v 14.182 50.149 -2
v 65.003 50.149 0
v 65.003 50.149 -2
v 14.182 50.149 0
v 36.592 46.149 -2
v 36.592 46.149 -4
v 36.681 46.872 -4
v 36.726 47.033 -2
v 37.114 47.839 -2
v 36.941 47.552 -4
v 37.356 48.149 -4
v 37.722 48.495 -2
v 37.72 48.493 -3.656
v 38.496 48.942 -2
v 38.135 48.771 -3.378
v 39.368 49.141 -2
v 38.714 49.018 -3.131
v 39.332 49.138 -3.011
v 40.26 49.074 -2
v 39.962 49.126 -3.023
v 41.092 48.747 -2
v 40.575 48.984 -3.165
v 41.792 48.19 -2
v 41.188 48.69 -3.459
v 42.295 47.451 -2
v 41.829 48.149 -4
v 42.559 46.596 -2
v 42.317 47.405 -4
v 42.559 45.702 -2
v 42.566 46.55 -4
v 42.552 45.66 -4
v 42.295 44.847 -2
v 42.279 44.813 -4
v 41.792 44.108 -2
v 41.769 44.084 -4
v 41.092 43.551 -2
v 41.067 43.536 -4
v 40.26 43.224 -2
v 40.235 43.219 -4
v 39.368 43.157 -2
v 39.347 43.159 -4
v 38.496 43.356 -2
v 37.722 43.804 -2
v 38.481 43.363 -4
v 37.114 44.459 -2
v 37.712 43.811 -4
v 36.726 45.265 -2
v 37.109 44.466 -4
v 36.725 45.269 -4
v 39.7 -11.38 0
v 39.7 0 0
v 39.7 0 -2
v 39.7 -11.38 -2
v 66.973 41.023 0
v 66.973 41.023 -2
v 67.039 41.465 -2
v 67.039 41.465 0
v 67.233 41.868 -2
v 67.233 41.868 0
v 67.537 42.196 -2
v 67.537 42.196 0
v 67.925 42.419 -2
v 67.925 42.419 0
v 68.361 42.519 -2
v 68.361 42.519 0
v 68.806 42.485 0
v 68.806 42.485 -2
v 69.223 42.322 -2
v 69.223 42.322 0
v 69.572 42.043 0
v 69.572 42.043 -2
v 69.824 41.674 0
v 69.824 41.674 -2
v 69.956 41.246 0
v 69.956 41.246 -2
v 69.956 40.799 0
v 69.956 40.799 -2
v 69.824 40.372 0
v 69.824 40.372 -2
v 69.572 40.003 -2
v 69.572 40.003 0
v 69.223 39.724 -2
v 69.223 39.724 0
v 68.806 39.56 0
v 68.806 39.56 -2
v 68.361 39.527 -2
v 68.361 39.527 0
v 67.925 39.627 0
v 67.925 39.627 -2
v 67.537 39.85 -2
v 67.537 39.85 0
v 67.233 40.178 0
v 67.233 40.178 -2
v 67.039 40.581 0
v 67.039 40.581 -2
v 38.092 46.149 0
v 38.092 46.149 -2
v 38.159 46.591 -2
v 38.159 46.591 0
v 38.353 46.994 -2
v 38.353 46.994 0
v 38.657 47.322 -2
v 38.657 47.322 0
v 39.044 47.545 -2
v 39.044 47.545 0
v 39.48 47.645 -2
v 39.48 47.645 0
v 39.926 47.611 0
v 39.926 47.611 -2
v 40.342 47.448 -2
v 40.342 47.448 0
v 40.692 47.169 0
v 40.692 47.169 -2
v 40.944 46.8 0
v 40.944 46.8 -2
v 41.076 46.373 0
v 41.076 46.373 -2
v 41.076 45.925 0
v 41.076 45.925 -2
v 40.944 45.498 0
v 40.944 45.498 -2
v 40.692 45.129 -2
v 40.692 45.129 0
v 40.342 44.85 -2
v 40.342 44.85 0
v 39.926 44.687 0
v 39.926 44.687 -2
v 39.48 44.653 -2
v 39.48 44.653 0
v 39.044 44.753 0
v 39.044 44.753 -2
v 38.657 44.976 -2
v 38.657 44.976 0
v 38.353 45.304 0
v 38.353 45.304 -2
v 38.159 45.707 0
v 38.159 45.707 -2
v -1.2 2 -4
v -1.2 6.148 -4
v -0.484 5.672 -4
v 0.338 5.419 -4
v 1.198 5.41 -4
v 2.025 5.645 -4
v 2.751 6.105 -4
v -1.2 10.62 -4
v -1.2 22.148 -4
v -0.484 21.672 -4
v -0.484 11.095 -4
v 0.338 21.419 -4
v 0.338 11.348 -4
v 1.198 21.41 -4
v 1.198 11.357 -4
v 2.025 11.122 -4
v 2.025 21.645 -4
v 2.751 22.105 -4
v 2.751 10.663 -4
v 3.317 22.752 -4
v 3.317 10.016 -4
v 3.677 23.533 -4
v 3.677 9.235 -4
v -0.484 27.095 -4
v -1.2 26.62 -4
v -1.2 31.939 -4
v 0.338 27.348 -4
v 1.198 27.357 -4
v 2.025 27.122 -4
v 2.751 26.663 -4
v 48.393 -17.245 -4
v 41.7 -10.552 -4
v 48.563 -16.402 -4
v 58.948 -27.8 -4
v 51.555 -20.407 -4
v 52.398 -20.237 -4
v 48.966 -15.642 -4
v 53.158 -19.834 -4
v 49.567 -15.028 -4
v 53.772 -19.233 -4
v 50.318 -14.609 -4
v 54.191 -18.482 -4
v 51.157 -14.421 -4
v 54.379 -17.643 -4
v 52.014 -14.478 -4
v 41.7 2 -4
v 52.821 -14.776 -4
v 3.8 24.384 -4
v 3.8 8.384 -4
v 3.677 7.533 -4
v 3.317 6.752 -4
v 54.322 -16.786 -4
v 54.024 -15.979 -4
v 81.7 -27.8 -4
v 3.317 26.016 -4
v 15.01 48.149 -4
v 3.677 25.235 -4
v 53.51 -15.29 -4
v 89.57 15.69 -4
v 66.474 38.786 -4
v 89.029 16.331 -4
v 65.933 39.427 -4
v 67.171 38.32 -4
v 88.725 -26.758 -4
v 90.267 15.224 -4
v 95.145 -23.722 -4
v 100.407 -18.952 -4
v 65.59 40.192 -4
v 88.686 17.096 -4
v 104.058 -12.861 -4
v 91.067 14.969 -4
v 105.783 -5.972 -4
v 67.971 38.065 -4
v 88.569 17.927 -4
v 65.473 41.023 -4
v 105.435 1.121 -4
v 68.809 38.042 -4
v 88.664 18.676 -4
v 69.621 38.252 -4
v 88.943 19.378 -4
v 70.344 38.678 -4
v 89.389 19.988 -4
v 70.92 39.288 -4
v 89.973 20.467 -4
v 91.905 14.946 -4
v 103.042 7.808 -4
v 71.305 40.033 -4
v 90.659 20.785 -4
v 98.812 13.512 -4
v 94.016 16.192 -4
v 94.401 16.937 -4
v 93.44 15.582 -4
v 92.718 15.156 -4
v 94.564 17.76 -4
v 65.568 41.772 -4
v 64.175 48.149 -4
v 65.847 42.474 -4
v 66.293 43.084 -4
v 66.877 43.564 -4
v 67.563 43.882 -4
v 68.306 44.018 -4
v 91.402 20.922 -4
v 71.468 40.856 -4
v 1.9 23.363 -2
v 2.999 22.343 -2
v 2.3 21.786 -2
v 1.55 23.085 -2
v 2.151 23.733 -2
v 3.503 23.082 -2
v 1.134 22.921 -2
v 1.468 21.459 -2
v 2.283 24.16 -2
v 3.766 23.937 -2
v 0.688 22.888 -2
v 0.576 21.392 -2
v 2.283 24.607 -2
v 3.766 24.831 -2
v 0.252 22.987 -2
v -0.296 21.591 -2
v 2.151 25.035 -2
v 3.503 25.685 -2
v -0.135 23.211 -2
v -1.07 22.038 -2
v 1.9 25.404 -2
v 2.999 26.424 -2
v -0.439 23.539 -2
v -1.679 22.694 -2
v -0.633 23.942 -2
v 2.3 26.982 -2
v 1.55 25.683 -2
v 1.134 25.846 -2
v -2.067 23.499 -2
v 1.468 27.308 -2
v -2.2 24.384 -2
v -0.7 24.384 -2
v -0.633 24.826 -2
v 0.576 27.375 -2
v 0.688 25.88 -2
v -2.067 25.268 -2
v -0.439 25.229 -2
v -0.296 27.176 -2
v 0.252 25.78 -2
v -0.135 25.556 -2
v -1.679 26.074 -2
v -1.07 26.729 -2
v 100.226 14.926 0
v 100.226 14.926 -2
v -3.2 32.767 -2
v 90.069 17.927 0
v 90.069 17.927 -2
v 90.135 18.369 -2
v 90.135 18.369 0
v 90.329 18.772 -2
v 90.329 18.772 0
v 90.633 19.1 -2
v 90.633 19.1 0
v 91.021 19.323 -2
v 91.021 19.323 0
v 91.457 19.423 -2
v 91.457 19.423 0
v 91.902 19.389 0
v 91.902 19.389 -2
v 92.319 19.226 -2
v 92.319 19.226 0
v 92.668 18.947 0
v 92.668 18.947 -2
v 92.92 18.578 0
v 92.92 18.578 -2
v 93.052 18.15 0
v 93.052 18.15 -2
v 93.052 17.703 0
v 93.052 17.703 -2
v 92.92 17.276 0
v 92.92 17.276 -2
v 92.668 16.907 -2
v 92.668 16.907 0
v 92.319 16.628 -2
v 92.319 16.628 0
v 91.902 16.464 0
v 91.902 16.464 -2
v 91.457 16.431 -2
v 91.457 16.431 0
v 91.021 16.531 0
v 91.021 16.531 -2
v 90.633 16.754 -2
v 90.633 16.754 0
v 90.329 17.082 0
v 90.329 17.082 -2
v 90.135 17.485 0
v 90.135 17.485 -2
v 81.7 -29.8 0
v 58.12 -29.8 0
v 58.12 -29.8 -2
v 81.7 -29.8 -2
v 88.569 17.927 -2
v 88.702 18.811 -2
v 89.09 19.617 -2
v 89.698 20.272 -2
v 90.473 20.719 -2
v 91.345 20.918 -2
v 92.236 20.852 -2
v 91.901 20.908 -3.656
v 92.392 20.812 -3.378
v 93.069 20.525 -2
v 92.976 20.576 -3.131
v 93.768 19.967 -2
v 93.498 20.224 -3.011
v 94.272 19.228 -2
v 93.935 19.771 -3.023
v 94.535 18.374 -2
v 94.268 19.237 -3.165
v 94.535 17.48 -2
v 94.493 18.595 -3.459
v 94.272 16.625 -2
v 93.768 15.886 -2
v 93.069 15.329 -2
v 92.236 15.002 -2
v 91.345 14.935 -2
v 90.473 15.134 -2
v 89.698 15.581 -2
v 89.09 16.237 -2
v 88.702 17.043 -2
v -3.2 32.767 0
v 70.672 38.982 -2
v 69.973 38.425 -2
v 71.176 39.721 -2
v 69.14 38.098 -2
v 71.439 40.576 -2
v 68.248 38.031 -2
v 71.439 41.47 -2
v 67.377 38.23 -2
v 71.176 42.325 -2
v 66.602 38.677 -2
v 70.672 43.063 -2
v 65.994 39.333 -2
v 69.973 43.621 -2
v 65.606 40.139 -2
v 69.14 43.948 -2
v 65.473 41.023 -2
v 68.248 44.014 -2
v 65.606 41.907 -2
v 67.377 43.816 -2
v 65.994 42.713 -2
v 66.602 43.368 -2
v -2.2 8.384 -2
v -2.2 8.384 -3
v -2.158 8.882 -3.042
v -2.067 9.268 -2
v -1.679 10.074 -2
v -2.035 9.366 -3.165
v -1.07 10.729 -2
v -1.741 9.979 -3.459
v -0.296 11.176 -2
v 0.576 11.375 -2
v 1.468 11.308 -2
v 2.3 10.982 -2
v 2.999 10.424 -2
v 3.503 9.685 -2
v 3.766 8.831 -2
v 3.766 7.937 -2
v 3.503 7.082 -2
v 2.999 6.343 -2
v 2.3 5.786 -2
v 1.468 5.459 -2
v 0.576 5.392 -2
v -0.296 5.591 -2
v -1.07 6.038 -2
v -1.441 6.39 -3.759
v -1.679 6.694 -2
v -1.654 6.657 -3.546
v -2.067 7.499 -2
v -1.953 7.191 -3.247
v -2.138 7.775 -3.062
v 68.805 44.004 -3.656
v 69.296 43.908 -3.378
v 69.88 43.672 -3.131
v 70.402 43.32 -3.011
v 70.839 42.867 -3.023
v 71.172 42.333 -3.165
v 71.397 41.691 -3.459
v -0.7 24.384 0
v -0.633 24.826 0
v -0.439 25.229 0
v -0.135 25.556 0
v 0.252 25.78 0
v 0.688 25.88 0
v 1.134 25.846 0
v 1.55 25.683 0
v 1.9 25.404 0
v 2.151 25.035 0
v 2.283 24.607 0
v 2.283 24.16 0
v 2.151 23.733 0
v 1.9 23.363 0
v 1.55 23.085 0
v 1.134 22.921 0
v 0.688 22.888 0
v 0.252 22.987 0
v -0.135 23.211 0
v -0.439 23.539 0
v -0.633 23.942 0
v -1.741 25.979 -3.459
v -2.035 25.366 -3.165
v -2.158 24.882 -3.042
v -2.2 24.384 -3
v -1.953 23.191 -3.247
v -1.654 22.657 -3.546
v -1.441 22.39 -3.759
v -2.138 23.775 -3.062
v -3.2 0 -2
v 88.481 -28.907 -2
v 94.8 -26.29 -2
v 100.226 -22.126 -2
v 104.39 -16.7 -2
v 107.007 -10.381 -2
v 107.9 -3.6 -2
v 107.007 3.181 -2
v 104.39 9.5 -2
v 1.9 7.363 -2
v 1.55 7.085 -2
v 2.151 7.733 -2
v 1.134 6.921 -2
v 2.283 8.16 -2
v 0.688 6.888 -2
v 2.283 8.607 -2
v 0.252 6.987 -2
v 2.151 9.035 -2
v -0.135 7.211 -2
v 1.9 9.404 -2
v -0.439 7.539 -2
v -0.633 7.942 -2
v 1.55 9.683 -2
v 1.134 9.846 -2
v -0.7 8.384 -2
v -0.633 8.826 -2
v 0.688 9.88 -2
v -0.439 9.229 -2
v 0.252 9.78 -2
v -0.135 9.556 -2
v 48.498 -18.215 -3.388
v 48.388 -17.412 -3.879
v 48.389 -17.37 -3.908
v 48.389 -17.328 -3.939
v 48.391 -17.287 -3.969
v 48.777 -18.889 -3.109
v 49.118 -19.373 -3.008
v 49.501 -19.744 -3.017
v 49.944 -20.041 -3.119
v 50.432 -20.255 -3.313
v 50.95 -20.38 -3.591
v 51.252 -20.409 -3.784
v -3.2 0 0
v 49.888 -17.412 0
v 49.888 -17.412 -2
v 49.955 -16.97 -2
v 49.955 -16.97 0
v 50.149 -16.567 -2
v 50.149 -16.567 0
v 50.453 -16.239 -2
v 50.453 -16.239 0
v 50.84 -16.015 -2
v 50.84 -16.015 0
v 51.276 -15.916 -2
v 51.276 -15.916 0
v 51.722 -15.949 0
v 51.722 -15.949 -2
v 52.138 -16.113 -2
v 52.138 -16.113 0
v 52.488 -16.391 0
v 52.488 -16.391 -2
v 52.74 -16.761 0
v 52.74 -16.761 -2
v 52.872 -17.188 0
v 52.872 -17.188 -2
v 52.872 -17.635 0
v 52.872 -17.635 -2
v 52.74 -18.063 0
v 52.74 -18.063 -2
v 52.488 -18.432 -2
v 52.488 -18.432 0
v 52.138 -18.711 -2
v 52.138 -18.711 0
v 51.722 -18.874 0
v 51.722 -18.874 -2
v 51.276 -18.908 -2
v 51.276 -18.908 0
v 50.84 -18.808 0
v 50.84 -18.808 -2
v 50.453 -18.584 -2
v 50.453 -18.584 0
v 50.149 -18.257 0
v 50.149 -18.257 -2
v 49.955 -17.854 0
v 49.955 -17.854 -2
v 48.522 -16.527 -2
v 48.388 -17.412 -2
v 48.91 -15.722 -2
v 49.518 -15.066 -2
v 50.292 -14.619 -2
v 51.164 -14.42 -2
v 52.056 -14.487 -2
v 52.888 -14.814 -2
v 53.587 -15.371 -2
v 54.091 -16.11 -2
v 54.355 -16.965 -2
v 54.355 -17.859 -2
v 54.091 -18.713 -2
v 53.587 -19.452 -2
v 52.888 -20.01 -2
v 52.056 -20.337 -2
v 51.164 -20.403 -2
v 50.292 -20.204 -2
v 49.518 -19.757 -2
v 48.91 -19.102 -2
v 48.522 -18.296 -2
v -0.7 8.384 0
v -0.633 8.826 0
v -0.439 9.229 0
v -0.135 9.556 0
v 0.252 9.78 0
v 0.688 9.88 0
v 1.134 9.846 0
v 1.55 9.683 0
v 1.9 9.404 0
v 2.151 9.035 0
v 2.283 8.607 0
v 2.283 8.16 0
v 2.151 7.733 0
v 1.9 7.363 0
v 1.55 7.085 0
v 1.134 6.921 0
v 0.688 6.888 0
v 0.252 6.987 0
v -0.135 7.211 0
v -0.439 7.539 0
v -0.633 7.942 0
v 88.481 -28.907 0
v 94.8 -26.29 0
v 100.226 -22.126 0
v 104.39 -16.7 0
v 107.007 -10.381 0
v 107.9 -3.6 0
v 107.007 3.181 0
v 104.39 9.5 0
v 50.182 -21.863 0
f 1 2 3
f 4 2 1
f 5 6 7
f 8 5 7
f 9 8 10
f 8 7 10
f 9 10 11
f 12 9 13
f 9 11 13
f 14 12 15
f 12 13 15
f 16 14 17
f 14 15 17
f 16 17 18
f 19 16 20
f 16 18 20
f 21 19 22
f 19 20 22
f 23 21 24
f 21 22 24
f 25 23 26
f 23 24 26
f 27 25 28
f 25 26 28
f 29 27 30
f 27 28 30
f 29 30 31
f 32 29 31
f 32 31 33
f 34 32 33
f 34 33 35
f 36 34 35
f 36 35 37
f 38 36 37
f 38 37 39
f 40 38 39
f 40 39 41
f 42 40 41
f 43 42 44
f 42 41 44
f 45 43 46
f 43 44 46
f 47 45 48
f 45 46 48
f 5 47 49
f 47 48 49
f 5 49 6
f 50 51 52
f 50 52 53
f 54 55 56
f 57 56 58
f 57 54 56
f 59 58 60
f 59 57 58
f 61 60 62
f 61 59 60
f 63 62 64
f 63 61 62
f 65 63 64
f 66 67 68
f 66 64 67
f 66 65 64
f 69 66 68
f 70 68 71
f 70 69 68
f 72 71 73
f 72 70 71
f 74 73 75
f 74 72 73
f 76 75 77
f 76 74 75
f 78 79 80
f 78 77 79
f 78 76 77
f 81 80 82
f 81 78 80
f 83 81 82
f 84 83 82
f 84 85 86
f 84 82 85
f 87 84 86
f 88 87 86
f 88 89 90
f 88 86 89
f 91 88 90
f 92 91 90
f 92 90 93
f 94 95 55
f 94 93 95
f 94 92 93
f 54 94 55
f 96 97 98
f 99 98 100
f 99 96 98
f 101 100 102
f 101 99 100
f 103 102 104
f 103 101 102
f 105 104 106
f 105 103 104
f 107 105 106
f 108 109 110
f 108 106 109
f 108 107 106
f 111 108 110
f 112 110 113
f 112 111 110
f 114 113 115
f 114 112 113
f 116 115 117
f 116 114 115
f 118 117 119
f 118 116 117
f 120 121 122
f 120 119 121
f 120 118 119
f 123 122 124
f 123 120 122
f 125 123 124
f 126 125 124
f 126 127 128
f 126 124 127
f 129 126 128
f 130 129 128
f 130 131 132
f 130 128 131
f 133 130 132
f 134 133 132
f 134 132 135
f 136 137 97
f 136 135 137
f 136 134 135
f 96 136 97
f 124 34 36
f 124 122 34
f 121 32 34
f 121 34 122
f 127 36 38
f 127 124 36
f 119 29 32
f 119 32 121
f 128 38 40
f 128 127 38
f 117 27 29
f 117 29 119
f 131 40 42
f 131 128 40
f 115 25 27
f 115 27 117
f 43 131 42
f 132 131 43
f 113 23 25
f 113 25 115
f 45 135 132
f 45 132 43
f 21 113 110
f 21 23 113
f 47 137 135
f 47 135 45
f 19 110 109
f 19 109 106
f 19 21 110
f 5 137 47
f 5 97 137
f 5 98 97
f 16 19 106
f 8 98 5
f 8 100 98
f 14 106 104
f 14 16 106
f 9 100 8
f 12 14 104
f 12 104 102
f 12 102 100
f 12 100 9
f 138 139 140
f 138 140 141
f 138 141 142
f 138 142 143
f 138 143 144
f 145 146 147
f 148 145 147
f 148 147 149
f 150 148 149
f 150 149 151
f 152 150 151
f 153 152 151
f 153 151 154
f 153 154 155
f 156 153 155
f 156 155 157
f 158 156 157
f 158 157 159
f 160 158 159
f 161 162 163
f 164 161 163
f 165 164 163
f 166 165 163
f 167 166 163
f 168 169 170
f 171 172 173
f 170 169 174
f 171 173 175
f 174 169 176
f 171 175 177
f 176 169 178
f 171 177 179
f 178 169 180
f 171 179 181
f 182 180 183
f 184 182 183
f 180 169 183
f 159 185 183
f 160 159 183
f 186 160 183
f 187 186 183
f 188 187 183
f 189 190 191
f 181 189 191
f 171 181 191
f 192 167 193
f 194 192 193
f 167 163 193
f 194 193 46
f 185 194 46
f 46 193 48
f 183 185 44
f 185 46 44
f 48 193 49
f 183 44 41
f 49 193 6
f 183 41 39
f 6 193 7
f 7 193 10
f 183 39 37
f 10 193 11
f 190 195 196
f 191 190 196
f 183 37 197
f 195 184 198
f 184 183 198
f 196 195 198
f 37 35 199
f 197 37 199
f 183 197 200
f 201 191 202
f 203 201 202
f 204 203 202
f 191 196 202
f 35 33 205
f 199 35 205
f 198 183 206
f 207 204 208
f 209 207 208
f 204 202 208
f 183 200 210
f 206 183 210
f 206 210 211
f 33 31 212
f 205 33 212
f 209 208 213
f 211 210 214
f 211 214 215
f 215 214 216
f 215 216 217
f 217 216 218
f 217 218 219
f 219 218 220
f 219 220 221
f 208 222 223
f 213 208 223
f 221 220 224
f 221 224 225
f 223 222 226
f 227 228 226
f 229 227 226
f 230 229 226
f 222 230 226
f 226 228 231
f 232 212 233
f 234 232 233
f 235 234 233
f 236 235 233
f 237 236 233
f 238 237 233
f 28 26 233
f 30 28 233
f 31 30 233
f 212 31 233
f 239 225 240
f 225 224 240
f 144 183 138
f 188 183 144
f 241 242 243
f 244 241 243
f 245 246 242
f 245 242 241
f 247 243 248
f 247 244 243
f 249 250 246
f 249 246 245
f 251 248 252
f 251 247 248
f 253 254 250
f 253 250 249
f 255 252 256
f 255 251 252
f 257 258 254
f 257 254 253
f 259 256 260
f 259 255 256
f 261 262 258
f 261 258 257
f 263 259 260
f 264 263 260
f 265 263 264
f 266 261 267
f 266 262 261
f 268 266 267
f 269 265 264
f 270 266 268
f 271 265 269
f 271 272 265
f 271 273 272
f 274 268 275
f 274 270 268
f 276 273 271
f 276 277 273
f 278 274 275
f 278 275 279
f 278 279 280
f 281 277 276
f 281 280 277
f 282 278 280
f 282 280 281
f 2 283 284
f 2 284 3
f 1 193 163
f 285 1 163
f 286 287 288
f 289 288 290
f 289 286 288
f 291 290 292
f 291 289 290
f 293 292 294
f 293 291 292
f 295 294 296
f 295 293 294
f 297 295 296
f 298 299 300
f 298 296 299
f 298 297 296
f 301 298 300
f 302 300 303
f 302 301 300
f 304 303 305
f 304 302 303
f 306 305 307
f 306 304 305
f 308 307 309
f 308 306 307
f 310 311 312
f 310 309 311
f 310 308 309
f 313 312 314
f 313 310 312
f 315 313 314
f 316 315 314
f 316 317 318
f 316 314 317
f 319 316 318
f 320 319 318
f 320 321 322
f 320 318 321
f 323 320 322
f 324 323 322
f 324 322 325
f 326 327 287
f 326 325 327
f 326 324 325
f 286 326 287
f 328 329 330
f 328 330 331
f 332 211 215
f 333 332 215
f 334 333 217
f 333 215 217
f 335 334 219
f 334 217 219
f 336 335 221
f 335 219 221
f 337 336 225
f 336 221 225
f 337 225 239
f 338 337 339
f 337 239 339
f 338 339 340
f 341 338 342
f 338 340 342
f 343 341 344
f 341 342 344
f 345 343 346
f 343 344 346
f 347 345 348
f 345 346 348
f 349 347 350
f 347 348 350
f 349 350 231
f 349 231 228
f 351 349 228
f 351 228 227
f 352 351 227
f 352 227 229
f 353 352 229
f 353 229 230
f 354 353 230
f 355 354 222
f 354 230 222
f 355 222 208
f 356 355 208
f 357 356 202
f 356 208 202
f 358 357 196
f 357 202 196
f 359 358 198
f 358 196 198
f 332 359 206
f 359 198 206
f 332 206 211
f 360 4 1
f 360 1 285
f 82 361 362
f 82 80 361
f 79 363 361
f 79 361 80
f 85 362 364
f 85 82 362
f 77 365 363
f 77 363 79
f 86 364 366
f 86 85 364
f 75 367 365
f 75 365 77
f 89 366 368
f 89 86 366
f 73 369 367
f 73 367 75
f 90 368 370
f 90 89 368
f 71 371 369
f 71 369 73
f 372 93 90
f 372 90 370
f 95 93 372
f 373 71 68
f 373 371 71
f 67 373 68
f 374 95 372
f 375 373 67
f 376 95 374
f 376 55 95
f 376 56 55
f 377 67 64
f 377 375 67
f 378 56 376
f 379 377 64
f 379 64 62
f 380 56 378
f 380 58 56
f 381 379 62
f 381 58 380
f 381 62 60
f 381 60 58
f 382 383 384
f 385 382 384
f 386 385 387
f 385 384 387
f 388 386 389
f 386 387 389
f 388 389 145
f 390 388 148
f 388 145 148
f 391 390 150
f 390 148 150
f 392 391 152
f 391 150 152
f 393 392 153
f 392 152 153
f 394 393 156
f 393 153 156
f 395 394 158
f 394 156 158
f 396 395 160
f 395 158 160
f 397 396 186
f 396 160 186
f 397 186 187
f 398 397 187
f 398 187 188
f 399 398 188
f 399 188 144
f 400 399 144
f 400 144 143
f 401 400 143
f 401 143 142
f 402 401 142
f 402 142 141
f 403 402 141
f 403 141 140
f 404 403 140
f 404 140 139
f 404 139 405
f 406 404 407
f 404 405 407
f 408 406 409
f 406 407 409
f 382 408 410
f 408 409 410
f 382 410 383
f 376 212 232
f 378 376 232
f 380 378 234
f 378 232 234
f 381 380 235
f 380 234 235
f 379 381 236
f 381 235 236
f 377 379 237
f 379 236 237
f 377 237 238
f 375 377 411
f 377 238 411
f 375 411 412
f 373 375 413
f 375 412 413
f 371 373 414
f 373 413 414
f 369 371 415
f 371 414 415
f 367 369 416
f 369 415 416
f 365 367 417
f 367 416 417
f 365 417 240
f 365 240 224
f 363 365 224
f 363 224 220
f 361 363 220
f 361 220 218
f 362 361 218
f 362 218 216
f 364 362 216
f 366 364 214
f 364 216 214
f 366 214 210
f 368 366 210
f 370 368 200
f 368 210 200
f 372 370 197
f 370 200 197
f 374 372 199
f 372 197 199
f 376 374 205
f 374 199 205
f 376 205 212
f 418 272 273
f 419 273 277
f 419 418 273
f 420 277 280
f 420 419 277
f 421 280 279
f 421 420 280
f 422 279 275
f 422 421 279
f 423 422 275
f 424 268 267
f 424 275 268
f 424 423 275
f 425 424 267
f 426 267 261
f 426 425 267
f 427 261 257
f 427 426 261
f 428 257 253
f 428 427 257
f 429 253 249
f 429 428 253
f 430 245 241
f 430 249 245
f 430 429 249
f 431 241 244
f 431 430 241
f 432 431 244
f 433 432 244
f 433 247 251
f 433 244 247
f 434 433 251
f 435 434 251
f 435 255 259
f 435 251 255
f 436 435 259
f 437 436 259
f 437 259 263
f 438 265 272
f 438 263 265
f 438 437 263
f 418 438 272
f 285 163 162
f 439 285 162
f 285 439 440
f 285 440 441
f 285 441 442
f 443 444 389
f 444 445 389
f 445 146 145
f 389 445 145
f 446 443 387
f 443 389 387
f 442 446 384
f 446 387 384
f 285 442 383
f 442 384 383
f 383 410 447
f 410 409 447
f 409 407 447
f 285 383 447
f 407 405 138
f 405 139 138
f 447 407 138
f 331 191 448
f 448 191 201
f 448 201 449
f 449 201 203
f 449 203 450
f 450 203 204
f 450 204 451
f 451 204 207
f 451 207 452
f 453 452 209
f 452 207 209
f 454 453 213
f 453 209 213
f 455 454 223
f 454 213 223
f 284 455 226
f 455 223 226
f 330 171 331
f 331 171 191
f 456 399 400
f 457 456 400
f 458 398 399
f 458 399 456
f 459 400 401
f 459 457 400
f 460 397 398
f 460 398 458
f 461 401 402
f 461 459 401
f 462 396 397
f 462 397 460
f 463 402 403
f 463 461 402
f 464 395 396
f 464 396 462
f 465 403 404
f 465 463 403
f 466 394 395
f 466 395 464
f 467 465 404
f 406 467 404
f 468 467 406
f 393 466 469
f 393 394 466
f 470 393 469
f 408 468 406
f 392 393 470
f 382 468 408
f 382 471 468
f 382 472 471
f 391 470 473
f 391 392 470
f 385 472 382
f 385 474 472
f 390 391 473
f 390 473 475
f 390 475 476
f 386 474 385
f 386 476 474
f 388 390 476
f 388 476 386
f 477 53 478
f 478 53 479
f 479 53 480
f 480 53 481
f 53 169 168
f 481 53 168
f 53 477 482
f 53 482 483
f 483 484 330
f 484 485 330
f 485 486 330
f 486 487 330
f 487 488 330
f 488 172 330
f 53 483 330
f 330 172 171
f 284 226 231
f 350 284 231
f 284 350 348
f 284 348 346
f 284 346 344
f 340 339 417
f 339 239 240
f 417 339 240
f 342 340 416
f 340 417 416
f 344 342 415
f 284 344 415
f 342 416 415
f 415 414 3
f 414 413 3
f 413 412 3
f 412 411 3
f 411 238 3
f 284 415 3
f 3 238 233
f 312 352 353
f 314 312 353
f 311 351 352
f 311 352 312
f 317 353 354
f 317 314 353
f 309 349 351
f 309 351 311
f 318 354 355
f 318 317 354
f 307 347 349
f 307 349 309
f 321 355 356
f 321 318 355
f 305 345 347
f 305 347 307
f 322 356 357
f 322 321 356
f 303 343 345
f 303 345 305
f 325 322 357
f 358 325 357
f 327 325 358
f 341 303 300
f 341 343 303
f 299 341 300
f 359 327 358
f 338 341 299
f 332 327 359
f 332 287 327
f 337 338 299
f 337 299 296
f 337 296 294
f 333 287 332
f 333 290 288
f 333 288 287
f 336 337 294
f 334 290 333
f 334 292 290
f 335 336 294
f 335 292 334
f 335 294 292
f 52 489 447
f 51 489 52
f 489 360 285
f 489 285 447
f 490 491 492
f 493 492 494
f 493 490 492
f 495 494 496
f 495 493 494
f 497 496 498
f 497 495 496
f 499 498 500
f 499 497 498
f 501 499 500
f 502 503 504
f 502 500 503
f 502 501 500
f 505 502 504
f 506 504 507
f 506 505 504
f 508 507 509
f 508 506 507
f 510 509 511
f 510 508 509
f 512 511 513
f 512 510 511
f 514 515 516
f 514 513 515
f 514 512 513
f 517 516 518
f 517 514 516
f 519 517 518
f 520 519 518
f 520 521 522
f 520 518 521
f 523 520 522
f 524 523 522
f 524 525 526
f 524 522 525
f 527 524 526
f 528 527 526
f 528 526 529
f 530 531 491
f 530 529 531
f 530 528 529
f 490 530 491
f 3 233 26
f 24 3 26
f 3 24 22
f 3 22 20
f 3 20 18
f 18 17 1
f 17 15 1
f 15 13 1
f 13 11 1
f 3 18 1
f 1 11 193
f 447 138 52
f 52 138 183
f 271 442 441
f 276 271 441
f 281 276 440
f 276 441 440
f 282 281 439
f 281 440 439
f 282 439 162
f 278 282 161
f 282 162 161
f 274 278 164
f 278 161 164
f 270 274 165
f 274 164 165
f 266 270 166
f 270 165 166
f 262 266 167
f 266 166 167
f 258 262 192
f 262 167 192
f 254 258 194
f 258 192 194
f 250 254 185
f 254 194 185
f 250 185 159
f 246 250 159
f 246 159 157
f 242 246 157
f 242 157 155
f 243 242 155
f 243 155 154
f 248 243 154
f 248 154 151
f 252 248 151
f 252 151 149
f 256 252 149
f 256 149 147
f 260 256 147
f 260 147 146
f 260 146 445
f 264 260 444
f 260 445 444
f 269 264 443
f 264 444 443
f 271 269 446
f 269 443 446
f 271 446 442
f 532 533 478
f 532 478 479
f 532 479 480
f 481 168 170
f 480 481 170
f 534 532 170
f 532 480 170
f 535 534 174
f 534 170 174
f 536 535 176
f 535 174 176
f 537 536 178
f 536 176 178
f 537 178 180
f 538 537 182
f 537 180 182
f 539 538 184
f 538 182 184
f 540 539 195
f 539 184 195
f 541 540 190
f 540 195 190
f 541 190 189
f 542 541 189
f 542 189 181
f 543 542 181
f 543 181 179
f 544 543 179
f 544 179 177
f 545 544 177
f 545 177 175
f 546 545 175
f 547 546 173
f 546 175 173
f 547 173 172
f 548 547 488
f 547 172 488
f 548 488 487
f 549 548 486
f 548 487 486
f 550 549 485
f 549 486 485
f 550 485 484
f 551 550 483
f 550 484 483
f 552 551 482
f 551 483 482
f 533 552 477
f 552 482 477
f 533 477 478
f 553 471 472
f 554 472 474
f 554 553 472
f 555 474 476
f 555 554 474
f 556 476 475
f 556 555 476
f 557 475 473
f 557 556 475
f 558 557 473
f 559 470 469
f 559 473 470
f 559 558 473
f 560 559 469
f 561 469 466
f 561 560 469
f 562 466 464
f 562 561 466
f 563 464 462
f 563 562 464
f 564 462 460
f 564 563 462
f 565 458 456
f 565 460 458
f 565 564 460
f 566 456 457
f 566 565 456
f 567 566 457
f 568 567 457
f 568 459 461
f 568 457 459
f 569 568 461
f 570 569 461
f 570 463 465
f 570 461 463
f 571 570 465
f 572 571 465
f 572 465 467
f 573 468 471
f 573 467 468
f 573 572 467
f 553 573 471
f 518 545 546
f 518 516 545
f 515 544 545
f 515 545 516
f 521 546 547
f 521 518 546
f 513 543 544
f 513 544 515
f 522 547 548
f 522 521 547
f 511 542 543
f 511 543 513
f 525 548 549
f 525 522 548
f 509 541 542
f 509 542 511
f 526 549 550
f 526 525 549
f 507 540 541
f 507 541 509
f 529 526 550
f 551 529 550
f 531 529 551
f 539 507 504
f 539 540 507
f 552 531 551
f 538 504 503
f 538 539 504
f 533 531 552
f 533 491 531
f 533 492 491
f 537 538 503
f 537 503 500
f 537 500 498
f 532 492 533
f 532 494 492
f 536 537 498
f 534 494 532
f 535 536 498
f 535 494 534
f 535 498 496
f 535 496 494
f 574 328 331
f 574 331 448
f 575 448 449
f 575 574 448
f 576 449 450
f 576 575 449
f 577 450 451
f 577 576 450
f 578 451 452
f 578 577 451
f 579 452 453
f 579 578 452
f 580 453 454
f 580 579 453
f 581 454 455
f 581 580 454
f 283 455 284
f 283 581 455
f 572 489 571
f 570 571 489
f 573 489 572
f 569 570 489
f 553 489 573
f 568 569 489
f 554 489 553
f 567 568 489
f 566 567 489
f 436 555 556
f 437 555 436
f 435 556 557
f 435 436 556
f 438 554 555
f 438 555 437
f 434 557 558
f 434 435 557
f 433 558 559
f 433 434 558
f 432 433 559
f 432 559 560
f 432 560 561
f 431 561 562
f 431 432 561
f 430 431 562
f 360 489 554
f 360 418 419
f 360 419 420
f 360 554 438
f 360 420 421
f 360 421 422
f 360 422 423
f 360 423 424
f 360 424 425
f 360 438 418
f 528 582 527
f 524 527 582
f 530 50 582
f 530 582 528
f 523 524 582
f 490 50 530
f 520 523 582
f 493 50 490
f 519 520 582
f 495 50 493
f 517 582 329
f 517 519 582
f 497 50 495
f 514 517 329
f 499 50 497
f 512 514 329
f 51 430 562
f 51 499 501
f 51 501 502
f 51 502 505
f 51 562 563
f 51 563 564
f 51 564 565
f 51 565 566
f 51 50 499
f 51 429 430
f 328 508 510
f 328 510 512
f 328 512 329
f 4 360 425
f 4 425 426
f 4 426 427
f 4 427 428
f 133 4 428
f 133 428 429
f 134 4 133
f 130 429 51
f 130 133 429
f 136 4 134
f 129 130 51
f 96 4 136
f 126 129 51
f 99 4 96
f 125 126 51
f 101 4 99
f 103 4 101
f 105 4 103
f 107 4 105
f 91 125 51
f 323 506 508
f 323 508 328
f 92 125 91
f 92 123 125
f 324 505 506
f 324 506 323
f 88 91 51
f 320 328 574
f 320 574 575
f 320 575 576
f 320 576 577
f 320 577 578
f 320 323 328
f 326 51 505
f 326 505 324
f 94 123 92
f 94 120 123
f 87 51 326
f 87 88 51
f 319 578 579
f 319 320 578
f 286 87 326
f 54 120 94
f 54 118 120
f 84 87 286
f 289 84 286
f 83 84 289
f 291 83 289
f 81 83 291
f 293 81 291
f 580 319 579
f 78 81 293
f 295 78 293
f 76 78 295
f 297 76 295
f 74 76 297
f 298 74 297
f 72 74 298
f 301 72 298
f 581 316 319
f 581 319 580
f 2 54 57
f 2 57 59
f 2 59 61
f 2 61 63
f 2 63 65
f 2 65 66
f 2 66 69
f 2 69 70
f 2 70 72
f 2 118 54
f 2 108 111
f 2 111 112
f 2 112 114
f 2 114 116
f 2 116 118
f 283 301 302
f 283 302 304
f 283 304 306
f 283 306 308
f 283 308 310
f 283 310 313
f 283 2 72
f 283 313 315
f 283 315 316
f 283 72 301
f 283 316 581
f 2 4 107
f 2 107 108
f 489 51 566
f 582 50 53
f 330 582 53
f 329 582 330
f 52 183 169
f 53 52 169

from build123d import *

# Parameters (mm, degrees)
RESSALTO_EXTRUS_O1_DEPTH = 48
ESBO_O12_R               = 1.5
CORTE_EXTRUS_O10_DEPTH   = 10
ESBO_O13_R               = 1.5
CORTE_EXTRUS_O11_DEPTH   = 10
ESBO_O14_R               = 1.5
CORTE_EXTRUS_O12_DEPTH   = 10
ESBO_O15_R               = 1.5
CORTE_EXTRUS_O13_DEPTH   = 10
CORTE_EXTRUS_O14_DEPTH   = 10
ESBO_O17_R               = 4
ESBO_O17_W               = 2.8
ESBO_O17_H               = 2.8
RESSALTO_EXTRUS_O2_DEPTH = 4
ESBO_O18_R               = 1.5
RESSALTO_EXTRUS_O3_DEPTH = 4
CHANFRO1_SIZE            = 2
CORTE_EXTRUS_O15_DEPTH   = 48
ESBO_O20_R               = 3
CORTE_EXTRUS_O16_DEPTH   = 2


with BuildPart() as part:
    # Model → Ressalto-extrusão1 (new body)
    with BuildSketch(Plane.XY):
        with BuildLine():
            Line((-0.7, 0), (39, 0))
            Line((39, 0), (39.7, 0))
            Line((39.7, 0), (39.7, -11.380317396))
            Line((39.7, -11.380317396), (50.182424304, -21.8627417))
            Line((50.182424304, -21.8627417), (58.119682605, -29.8))
            Line((58.119682605, -29.8), (81.7, -29.8))
            ThreePointArc((81.7, -29.8), (105.905643752, -13.626305928), (100.226197667, 14.926197667))
            Line((100.226197667, 14.926197667), (65.00338056, 50.149014774))
            Line((65.00338056, 50.149014774), (50.111140335, 50.149014774))
            Line((50.111140335, 50.149014774), (14.181595121, 50.149014774))
            Line((14.181595121, 50.149014774), (-3.2, 32.767419653))
            Line((-3.2, 32.767419653), (-3.2, 5))
            Line((-3.2, 5), (-3.2, 0))
            Line((-3.2, 0), (-0.7, 0))
        make_face()
        with BuildLine():
            Line((-0.7, 2.5), (39, 2.5))
            Line((39, 2.5), (39.7, 2.5))
            Line((39.7, 2.5), (42.2, 2.5))
            Line((42.2, 2.5), (42.2, -10.34478349))
            Line((42.2, -10.34478349), (51.950191257, -20.094974747))
            Line((51.950191257, -20.094974747), (59.15521651, -27.3))
            Line((59.15521651, -27.3), (81.7, -27.3))
            ThreePointArc((81.7, -27.3), (103.595944921, -12.669597347), (98.458430714, 13.158430714))
            Line((98.458430714, 13.158430714), (63.967846654, 47.649014774))
            Line((63.967846654, 47.649014774), (50.111140335, 47.649014774))
            Line((50.111140335, 47.649014774), (15.217129027, 47.649014774))
            Line((15.217129027, 47.649014774), (-0.7, 31.731885747))
            Line((-0.7, 31.731885747), (-0.7, 2.5))
        make_face(mode=Mode.SUBTRACT)
    extrude(amount=RESSALTO_EXTRUS_O1_DEPTH)

    # Esboço12 → Corte-extrusão10 (cut)
    with BuildSketch(Plane(origin=(57.576197667, 57.576197667, 0), x_dir=(0, 0, -1), z_dir=(0.707106781, 0.707106781, 0))):
        with Locations((-44, -19.409915607)):
            Circle(ESBO_O12_R)
        with Locations((-44, -51.409915607)):
            Circle(ESBO_O12_R)
    extrude(amount=-CORTE_EXTRUS_O10_DEPTH, mode=Mode.SUBTRACT)

    # Esboço13 → Corte-extrusão11 (cut)
    with BuildSketch(Plane(origin=(0, 50.149014774, 0), x_dir=(1, 0, 0), z_dir=(0, 1, 0))):
        with Locations((39.59248784, -44)):
            Circle(ESBO_O13_R)
    extrude(amount=-CORTE_EXTRUS_O11_DEPTH, mode=Mode.SUBTRACT)

    # Esboço14 → Corte-extrusão12 (cut)
    with BuildSketch(Plane.ZY.offset(3.2)):
        with Locations((44, 24.383709827)):
            Circle(ESBO_O14_R)
        with Locations((44, 8.383709827)):
            Circle(ESBO_O14_R)
    extrude(amount=-CORTE_EXTRUS_O12_DEPTH, mode=Mode.SUBTRACT)

    # Esboço15 → Corte-extrusão13 (cut)
    with BuildSketch(Plane(origin=(14.159841302, 14.159841302, 0), x_dir=(0, 0, 1), z_dir=(-0.707106781, -0.707106781, 0))):
        with Locations((44, -48.648946546)):
            Circle(ESBO_O15_R)
    extrude(amount=-CORTE_EXTRUS_O13_DEPTH, mode=Mode.SUBTRACT)

    # Esboço16 → Corte-extrusão14 (cut)
    with BuildSketch(Plane.XY.offset(48)):
        Polygon((39.7, 0), (39.7, -2), (42.2, -2), (42.2, 2.5), (-0.7, 2.5), (-0.7, 0), align=None)
    extrude(amount=-CORTE_EXTRUS_O14_DEPTH, mode=Mode.SUBTRACT)

    # Esboço17 → Ressalto-extrusão2 (add)
    with BuildSketch(Plane(origin=(0, 0, 0), x_dir=(-1, 0, 0), z_dir=(0, 0, -1))):
        with Locations((-91.100070488, 18.395470597)):
            Circle(ESBO_O17_R)
        with Locations((-91.100070488, 18.395470597)):
            Rectangle(ESBO_O17_W, ESBO_O17_H, mode=Mode.SUBTRACT)
        with Locations((-68.47265349, 41.022887595)):
            Circle(ESBO_O17_R)
        with Locations((-68.47265349, 41.022887595)):
            Rectangle(ESBO_O17_W, ESBO_O17_H, mode=Mode.SUBTRACT)
        with Locations((-39.59248784, 46.149014774)):
            Circle(ESBO_O17_R)
        with Locations((-39.59248784, 46.149014774)):
            Rectangle(ESBO_O17_W, ESBO_O17_H, mode=Mode.SUBTRACT)
        with Locations((-0.8, 24.383709827)):
            Circle(ESBO_O17_R)
        with Locations((-0.8, 24.383709827)):
            Rectangle(ESBO_O17_W, ESBO_O17_H, mode=Mode.SUBTRACT)
        with Locations((-0.8, 8.383709827)):
            Circle(ESBO_O17_R)
        with Locations((-0.8, 8.383709827)):
            Rectangle(ESBO_O17_W, ESBO_O17_H, mode=Mode.SUBTRACT)
        with Locations((-51.388268427, -17.411731573)):
            Circle(ESBO_O17_R)
        with Locations((-51.388268427, -17.411731573)):
            Rectangle(ESBO_O17_W, ESBO_O17_H, mode=Mode.SUBTRACT)
    extrude(amount=-RESSALTO_EXTRUS_O2_DEPTH)

    # Esboço18 → Ressalto-extrusão3 (add)
    with BuildSketch(Plane(origin=(0, 0, 0), x_dir=(-1, 0, 0), z_dir=(0, 0, -1))):
        with BuildLine():
            Line((-65.00338056, 50.149014774), (-14.181595121, 50.149014774))
            Line((-14.181595121, 50.149014774), (3.2, 32.767419653))
            Line((3.2, 32.767419653), (3.2, 0))
            Line((3.2, 0), (-39.7, 0))
            Line((-39.7, 0), (-39.7, -11.380317396))
            Line((-39.7, -11.380317396), (-58.119682605, -29.8))
            Line((-58.119682605, -29.8), (-81.7, -29.8))
            ThreePointArc((-81.7, -29.8), (-105.905643752, -13.626305928), (-100.226197667, 14.926197667))
            Line((-100.226197667, 14.926197667), (-65.00338056, 50.149014774))
        make_face()
        with Locations((-91.568699638, 17.926841447)):
            Circle(ESBO_O18_R, mode=Mode.SUBTRACT)
        with Locations((-68.47265349, 41.022887595)):
            Circle(ESBO_O18_R, mode=Mode.SUBTRACT)
        with Locations((-39.59248784, 46.149014774)):
            Circle(ESBO_O18_R, mode=Mode.SUBTRACT)
        with Locations((-0.8, 24.383709827)):
            Circle(ESBO_O18_R, mode=Mode.SUBTRACT)
        with Locations((-51.388268427, -17.411731573)):
            Circle(ESBO_O18_R, mode=Mode.SUBTRACT)
        with Locations((-0.8, 8.383709827)):
            Circle(ESBO_O18_R, mode=Mode.SUBTRACT)
    extrude(amount=RESSALTO_EXTRUS_O3_DEPTH)

    # Chanfro1
    chanfro1_edges = [part.edges().sort_by_distance(p)[0] for p in [
        (82.614789114, 32.53760622, -4),
        (105.905643752, -13.626305928, -4),
        (69.909841302, -29.8, -4),
        (48.909841302, -20.590158698, -4),
        (39.7, -5.690158698, -4),
        (18.25, 0, -4),
        (-3.2, 16.383709827, -4),
        (5.49079756, 41.458217213, -4),
        (39.59248784, 50.149014774, -4),
    ]]
    chamfer(chanfro1_edges, length=CHANFRO1_SIZE)

    # Esboço19 → Corte-extrusão15 (cut)
    with BuildSketch(Plane.XY.offset(48)):
        with BuildLine():
            Line((65.00338056, 50.149014774), (14.181595121, 50.149014774))
            Line((14.181595121, 50.149014774), (-3.2, 32.767419653))
            Line((-3.2, 32.767419653), (-3.2, 0))
            Line((-3.2, 0), (39.7, 0))
            Line((39.7, 0), (39.7, -11.380317396))
            Line((39.7, -11.380317396), (58.119682605, -29.8))
            Line((58.119682605, -29.8), (81.7, -29.8))
            ThreePointArc((81.7, -29.8), (105.905643752, -13.626305928), (100.226197667, 14.926197667))
            Line((100.226197667, 14.926197667), (65.00338056, 50.149014774))
        make_face()
    extrude(amount=-CORTE_EXTRUS_O15_DEPTH, mode=Mode.SUBTRACT)

    # Esboço20 → Corte-extrusão16 (cut)
    with BuildSketch(Plane(origin=(0, 0, -4), x_dir=(-1, 0, 0), z_dir=(0, 0, -1))):
        with Locations((-0.8, 24.383709827)):
            Circle(ESBO_O20_R)
        with Locations((-0.8, 8.383709827)):
            Circle(ESBO_O20_R)
        with Locations((-39.59248784, 46.149014774)):
            Circle(ESBO_O20_R)
        with Locations((-68.47265349, 41.022887595)):
            Circle(ESBO_O20_R)
        with Locations((-51.388268427, -17.411731573)):
            Circle(ESBO_O20_R)
        with Locations((-91.568699638, 17.926841447)):
            Circle(ESBO_O20_R)
    extrude(amount=-CORTE_EXTRUS_O16_DEPTH, mode=Mode.SUBTRACT)


solid = part.part
